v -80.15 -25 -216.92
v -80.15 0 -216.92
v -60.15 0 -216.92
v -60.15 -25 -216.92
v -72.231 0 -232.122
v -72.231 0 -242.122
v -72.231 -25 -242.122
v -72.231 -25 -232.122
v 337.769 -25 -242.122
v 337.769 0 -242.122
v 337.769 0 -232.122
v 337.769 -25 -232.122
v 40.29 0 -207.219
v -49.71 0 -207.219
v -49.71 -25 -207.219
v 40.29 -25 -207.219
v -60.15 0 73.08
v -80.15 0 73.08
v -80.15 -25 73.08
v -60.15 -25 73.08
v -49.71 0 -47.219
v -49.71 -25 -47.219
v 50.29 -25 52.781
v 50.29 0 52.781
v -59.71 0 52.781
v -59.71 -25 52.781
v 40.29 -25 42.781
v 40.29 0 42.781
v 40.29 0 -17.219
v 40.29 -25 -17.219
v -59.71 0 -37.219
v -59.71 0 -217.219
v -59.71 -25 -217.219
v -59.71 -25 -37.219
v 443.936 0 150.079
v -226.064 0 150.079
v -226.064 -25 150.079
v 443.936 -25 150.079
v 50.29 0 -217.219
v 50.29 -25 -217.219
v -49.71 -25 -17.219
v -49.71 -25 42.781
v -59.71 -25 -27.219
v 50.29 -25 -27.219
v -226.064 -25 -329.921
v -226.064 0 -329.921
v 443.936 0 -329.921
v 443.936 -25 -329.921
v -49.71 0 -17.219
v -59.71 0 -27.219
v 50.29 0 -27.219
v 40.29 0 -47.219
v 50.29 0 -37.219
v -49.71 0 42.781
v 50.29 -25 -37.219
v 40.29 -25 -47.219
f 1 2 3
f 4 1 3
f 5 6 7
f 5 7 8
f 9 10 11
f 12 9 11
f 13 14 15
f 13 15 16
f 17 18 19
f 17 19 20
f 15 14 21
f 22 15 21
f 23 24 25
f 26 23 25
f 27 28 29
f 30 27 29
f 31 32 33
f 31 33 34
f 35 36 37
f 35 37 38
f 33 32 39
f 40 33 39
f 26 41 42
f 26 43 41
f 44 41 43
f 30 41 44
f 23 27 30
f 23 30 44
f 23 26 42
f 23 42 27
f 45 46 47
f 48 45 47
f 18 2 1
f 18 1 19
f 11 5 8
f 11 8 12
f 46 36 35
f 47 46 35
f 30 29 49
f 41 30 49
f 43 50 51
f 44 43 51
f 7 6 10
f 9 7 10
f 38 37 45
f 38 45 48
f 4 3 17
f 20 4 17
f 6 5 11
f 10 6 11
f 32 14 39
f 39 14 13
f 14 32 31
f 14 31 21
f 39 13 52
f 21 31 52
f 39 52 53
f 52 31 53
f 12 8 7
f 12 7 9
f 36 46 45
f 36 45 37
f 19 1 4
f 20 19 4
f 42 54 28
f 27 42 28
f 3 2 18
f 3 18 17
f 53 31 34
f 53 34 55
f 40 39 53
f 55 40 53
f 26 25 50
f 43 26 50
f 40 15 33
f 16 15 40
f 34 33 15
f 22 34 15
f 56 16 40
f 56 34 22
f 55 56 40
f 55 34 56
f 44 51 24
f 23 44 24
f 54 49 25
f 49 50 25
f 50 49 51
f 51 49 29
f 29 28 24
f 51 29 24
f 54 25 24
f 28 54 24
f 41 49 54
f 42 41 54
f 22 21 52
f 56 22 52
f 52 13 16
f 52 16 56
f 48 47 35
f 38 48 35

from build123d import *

# Parameters (mm, degrees)
F0_W     = 110
F0_H     = 180
F0_W_2   = 90
F0_H_2   = 160
F1_DEPTH = 25
F2_W     = 20
F2_H     = 290
F4_DEPTH = 25
F3_W     = 410
F3_H     = 10
F5_DEPTH = 25
F6_W     = 670
F6_H     = 480
F7_DEPTH = 25


with BuildPart() as f1:
    # F0 (on Front) → F1 (new body)
    with BuildSketch(Plane.XZ):
        Polygon((50.290362, -27.218565), (50.290362, 0), (50.290362, 52.781435), (-59.709638, 52.781435), (-59.709638, -27.218565), align=None)
        Polygon((-49.709638, 0), (-49.709638, 42.781435), (40.290362, 42.781435), (40.290362, 0), (40.290362, -17.218565), (-49.709638, -17.218565), align=None, mode=Mode.SUBTRACT)
        with Locations((-4.709638, -127.218565)):
            Rectangle(F0_W, F0_H)
        with Locations((-4.709638, -127.218565)):
            Rectangle(F0_W_2, F0_H_2, mode=Mode.SUBTRACT)
    extrude(amount=F1_DEPTH)


with BuildPart() as f4:
    # F2 (on Front) → F4 (new body)
    with BuildSketch(Plane.XZ):
        with Locations((-70.149703, -71.920078)):
            Rectangle(F2_W, F2_H)
    extrude(amount=F4_DEPTH)


with BuildPart() as f5:
    # F3 (on Front) → F5 (new body)
    with BuildSketch(Plane.XZ):
        with Locations((132.768793, -237.12192)):
            Rectangle(F3_W, F3_H)
    extrude(amount=F5_DEPTH)


with BuildPart() as f7:
    # F6 (on Front) → F7 (new body)
    with BuildSketch(Plane.XZ):
        with Locations((108.935901, -89.921156)):
            Rectangle(F6_W, F6_H)
    extrude(amount=F7_DEPTH)


solid = Compound([f1.part, f4.part, f5.part, f7.part])
